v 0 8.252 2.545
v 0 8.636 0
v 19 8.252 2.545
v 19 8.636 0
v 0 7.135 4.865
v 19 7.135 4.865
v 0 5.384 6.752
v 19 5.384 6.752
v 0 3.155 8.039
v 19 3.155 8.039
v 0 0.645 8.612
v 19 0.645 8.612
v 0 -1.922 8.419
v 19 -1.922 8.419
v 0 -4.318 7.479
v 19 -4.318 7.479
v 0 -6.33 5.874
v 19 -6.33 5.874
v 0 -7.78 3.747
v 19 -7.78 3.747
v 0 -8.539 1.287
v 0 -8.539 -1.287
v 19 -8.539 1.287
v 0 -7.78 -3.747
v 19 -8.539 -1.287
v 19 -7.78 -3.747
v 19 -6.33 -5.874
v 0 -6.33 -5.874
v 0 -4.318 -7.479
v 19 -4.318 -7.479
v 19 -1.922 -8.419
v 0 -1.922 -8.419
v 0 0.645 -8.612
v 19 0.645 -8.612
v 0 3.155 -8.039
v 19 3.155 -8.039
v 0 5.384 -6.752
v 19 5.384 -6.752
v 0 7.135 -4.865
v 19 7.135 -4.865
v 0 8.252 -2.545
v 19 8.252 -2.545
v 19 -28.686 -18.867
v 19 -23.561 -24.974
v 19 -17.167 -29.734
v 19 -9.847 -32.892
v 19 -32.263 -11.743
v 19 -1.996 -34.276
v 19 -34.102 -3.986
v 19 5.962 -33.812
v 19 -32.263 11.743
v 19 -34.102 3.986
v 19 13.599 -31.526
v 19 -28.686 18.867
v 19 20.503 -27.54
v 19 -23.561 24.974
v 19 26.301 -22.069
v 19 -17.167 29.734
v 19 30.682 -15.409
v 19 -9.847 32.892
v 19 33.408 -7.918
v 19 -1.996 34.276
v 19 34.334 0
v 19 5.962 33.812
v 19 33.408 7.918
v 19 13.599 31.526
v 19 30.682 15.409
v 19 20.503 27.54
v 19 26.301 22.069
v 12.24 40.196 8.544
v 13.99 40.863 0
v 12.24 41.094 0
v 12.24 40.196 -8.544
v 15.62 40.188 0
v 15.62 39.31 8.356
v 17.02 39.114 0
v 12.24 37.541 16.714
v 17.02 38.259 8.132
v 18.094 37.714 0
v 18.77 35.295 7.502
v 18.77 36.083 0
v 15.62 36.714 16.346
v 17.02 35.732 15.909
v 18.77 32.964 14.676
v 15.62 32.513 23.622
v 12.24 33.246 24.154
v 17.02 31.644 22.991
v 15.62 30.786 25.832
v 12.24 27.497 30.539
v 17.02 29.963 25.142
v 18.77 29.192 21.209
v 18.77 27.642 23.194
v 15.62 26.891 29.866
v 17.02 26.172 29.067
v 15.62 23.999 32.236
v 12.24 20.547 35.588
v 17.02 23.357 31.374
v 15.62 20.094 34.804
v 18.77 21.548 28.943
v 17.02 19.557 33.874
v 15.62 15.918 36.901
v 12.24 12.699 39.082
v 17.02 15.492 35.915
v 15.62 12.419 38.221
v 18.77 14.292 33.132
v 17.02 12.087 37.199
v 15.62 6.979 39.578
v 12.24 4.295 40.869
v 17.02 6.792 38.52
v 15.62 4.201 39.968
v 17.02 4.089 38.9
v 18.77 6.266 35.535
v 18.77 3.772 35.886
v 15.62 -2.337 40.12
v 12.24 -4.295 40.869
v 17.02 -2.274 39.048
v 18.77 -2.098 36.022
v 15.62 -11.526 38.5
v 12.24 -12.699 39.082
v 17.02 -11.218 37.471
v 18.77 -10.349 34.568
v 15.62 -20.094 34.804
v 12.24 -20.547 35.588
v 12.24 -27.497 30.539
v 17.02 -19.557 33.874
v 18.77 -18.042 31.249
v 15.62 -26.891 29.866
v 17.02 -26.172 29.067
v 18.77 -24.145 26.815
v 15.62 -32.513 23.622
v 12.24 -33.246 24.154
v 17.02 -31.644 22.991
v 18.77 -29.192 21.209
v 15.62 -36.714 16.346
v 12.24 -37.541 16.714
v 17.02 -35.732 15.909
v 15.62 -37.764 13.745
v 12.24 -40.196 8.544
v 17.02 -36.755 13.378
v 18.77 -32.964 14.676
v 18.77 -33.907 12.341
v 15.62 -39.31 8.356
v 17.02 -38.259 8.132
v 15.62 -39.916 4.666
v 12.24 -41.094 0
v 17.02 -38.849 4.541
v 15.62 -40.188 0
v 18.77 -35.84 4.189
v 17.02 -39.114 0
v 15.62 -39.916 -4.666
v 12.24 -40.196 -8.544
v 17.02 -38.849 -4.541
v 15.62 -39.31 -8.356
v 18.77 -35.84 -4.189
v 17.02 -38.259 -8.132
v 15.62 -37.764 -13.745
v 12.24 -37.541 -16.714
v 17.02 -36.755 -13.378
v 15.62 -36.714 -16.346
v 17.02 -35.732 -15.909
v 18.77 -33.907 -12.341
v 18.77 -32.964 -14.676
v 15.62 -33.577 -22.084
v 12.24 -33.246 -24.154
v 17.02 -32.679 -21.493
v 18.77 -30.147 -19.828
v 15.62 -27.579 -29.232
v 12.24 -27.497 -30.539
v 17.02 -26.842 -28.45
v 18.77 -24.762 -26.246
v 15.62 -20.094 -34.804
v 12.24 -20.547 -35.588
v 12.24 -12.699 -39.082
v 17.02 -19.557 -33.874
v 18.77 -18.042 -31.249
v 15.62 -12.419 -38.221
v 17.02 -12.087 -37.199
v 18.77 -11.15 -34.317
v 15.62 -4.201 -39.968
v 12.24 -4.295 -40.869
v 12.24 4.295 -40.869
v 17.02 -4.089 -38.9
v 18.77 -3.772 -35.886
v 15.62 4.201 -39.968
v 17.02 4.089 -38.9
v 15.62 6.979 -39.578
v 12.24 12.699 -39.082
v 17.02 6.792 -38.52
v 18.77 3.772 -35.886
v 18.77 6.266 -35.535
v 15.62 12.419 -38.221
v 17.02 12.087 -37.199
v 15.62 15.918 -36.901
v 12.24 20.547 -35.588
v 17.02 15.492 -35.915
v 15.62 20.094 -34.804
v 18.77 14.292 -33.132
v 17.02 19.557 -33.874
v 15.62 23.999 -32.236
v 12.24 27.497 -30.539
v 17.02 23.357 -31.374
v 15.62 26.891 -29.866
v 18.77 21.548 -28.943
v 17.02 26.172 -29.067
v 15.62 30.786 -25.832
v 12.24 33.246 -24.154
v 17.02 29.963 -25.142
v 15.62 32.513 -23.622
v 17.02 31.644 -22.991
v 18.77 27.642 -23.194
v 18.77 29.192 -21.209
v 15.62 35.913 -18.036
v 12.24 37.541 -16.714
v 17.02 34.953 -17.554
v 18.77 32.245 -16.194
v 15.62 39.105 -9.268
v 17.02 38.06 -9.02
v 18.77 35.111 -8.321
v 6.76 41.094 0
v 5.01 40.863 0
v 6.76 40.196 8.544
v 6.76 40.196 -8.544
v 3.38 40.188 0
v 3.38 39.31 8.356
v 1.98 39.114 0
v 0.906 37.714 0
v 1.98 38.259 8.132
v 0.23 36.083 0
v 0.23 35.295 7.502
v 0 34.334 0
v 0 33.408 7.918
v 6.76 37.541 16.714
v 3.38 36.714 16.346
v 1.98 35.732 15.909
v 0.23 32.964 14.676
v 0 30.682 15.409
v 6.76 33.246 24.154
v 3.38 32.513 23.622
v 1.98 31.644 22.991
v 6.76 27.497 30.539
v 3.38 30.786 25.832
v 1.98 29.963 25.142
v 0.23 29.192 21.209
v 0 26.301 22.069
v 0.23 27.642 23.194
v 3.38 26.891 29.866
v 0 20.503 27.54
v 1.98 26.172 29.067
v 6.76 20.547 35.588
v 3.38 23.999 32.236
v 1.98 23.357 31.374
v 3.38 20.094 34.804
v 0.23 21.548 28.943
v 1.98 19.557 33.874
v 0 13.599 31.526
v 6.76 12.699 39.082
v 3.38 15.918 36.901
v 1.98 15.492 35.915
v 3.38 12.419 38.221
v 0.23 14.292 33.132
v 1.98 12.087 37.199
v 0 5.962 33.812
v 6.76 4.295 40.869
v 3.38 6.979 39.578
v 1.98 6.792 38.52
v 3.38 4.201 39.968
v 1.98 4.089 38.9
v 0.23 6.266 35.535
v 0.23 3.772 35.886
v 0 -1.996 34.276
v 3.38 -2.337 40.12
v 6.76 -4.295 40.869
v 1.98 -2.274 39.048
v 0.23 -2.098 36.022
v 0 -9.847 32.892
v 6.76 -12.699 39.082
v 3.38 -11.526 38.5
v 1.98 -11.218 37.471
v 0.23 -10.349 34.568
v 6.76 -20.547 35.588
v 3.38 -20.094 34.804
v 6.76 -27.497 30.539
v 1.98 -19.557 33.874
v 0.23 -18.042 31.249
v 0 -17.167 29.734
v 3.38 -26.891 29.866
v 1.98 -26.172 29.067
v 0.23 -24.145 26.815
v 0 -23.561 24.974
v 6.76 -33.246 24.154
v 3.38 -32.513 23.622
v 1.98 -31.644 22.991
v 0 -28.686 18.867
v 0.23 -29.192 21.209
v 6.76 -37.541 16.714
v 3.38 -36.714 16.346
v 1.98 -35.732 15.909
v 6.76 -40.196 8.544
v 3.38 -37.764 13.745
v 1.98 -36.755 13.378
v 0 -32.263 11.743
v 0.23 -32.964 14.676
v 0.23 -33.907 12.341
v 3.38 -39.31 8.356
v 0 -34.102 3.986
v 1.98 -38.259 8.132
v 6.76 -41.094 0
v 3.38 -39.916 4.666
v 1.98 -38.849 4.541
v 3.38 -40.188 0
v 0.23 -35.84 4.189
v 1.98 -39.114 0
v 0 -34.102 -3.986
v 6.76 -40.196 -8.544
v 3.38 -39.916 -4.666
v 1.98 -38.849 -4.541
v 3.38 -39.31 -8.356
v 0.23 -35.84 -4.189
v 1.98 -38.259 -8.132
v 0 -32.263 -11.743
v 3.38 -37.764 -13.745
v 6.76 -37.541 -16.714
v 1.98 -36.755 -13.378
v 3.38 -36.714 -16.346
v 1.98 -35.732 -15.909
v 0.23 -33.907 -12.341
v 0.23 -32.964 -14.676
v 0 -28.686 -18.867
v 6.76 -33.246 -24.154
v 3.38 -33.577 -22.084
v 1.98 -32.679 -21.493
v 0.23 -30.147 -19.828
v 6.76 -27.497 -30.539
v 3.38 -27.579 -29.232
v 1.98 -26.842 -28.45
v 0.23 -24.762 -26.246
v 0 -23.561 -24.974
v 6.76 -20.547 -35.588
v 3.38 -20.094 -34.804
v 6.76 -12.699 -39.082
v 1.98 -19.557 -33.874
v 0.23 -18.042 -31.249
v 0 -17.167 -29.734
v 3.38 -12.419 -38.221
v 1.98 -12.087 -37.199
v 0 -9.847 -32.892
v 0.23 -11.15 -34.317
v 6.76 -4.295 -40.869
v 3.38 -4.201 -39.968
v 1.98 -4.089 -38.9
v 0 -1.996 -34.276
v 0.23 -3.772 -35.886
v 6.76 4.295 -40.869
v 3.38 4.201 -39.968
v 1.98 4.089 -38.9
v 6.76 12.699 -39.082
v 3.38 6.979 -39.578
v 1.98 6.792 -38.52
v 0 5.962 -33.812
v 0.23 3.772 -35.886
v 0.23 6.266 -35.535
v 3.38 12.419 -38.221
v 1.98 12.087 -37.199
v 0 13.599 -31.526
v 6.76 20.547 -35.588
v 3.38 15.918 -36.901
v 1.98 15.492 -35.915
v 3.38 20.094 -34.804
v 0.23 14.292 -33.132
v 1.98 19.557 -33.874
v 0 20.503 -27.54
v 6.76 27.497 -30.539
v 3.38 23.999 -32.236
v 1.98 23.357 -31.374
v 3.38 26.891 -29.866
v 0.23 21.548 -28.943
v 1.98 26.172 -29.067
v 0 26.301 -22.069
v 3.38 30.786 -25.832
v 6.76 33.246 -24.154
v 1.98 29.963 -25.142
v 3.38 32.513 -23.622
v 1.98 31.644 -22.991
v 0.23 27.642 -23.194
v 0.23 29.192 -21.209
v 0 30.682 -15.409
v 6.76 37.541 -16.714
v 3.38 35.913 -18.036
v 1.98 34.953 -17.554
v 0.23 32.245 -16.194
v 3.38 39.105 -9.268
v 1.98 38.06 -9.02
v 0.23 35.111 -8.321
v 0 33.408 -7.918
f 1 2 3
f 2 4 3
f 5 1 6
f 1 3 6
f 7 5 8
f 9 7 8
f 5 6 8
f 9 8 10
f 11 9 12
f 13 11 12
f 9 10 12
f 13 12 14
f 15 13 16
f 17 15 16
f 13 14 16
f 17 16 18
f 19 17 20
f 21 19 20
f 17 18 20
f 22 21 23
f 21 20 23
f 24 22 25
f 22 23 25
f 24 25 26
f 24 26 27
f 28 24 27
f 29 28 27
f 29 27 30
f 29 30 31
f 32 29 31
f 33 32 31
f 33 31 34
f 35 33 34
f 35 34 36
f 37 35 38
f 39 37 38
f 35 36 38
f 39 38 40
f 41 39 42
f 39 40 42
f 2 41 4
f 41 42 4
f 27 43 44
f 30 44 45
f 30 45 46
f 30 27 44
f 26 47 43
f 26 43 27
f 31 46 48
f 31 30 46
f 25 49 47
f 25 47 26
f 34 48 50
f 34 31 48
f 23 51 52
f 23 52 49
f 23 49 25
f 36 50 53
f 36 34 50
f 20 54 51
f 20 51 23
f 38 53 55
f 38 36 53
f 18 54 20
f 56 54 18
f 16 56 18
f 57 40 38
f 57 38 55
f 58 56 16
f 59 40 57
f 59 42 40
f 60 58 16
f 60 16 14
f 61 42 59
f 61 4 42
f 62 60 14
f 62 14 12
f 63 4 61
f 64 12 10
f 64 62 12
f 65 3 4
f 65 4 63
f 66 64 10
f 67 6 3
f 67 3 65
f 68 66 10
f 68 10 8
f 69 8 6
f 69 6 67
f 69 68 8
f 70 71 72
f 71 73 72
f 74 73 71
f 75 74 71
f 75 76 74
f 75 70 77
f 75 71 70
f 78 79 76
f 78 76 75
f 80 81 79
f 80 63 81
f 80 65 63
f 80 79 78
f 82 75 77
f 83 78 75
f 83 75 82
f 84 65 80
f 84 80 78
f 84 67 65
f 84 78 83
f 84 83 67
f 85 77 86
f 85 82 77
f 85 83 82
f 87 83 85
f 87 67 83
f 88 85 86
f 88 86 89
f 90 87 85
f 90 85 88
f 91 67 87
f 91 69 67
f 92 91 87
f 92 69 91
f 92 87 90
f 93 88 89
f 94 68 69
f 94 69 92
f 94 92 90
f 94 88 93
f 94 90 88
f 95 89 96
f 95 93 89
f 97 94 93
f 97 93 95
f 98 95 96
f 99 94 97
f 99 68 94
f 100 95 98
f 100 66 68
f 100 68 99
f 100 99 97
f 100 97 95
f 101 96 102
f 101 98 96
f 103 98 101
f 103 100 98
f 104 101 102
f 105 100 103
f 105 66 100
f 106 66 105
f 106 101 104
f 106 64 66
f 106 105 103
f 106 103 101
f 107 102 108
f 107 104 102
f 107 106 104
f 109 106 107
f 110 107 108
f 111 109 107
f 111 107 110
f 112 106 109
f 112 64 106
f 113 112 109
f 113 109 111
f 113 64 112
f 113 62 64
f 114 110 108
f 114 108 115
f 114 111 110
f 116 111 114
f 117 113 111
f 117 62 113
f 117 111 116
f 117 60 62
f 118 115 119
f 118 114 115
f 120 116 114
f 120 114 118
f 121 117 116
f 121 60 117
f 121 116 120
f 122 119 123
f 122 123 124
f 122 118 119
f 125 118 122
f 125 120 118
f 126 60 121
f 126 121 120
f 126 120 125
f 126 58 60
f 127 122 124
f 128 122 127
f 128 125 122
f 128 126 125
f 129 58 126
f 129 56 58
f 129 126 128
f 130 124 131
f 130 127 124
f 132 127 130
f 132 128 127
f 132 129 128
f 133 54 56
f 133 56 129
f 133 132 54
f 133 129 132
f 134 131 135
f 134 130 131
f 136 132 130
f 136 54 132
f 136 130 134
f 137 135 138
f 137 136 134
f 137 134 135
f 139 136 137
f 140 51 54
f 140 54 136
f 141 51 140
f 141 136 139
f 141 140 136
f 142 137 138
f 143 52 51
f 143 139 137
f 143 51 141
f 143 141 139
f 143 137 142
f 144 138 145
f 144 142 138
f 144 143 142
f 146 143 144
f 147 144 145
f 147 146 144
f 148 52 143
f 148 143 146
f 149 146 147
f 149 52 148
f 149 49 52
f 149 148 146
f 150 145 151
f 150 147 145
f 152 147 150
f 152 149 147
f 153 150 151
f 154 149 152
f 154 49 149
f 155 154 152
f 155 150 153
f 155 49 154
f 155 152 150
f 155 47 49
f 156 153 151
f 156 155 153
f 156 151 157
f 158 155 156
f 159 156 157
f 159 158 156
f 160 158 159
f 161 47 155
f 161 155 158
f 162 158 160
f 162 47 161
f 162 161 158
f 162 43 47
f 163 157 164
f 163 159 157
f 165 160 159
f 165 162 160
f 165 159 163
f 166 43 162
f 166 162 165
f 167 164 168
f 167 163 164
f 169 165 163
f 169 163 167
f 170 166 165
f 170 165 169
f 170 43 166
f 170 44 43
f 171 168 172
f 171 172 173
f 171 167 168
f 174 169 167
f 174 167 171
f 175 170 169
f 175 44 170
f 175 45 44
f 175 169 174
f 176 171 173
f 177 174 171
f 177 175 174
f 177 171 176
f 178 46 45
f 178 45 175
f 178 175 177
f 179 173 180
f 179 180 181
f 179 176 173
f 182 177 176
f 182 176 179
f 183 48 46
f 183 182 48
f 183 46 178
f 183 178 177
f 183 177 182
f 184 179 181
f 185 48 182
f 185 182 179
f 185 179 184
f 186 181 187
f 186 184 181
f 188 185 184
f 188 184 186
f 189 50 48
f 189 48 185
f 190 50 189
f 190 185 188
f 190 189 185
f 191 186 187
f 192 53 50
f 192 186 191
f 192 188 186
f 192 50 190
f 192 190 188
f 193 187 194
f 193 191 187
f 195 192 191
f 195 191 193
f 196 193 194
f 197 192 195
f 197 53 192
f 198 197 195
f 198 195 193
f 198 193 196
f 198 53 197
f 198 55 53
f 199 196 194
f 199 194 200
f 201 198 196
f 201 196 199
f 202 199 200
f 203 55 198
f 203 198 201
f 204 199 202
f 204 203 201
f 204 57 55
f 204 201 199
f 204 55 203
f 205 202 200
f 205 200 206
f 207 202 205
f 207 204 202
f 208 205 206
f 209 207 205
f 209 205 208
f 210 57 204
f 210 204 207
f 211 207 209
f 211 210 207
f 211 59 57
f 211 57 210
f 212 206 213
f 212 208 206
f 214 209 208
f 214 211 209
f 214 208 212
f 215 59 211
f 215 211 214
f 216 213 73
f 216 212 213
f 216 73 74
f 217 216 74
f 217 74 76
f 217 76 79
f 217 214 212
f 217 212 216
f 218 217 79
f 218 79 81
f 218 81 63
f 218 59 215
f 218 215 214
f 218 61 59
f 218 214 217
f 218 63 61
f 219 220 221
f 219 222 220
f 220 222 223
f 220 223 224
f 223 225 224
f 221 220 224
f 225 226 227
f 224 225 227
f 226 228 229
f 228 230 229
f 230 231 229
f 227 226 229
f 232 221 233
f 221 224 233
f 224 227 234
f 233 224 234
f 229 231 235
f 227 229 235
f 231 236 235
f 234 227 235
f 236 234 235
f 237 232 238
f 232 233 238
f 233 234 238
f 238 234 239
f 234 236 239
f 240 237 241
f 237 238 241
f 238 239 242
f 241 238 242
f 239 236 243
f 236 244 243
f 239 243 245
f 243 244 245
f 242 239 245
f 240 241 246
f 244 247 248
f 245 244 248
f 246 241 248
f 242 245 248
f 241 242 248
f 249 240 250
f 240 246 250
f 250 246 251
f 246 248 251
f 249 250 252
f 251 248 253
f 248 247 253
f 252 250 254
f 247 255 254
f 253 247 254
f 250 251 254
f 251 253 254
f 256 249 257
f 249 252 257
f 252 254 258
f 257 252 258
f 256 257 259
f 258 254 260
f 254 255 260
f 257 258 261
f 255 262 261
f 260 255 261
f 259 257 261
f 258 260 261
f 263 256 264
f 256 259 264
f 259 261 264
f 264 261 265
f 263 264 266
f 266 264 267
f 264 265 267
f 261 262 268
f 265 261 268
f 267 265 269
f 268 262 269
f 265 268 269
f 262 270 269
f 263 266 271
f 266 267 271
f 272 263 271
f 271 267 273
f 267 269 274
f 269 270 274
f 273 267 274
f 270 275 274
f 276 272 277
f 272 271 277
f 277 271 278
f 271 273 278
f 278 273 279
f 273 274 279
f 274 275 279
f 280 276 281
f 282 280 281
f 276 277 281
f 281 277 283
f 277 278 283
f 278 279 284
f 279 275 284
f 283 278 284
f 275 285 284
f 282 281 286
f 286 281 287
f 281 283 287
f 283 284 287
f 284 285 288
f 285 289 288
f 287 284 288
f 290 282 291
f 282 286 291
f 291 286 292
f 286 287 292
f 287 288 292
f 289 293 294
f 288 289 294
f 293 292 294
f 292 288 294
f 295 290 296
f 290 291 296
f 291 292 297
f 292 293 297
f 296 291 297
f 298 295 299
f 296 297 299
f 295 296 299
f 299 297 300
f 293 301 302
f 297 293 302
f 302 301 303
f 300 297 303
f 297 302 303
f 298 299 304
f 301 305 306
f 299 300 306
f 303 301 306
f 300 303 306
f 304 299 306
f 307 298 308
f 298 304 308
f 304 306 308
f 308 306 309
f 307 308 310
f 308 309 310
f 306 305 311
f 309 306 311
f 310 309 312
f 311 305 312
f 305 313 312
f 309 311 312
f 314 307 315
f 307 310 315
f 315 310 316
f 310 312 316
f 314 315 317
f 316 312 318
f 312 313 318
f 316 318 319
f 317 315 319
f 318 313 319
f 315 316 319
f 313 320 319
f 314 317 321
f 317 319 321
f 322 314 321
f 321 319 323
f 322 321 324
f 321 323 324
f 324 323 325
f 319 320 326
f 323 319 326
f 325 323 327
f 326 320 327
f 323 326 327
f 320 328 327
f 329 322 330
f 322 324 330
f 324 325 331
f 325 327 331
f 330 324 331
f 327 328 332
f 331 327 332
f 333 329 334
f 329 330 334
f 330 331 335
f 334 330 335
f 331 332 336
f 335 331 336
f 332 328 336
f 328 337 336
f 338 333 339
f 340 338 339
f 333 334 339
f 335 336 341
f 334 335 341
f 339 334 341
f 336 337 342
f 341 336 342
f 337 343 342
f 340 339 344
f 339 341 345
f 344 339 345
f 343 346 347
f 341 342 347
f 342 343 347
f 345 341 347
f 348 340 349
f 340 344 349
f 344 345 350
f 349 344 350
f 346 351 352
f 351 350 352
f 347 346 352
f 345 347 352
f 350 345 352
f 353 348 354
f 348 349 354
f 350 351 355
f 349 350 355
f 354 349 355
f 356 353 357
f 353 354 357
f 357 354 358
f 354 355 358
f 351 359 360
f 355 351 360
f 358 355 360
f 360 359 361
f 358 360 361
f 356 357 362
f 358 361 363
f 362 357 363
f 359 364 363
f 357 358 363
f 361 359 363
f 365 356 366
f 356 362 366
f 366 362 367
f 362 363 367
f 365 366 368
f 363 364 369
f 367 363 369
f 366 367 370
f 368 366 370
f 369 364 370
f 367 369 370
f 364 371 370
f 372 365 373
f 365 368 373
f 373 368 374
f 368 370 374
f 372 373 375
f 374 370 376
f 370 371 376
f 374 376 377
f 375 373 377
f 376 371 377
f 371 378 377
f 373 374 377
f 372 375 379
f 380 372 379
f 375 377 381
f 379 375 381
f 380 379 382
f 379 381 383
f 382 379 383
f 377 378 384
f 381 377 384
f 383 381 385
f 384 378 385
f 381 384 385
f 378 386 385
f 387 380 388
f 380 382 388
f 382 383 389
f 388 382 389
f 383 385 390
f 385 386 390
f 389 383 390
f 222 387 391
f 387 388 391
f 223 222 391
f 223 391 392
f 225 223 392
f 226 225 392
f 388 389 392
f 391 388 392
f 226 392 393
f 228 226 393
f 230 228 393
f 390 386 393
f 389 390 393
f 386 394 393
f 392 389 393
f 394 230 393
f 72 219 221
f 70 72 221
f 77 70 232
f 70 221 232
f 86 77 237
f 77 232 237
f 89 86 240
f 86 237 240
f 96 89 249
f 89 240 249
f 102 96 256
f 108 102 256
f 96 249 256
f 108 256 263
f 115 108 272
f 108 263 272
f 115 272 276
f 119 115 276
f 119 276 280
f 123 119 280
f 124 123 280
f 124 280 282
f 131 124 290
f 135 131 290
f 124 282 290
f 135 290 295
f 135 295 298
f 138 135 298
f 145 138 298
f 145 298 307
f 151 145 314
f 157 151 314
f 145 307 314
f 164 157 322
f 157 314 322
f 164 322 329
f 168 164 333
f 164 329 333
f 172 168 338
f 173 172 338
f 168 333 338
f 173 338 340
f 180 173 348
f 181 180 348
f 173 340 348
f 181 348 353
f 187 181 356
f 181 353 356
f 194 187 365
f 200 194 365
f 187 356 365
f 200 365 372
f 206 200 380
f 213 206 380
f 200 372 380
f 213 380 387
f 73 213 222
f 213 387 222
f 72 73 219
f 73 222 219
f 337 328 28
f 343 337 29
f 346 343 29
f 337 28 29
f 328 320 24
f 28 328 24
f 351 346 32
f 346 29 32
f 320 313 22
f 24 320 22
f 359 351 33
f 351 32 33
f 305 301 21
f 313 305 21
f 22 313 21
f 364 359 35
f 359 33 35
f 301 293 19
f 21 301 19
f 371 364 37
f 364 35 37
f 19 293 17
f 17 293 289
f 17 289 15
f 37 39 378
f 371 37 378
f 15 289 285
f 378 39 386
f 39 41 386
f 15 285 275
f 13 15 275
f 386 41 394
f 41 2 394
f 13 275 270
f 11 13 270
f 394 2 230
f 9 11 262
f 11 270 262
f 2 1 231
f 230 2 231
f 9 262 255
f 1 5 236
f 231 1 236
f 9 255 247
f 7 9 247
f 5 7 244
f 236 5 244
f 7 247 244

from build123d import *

# Parameters (mm, degrees)
F0_R     = 41.093721
F1_DEPTH = 19
F2_R     = 6.759798
F3_R     = 8.635664
F4_DEPTH = 34.1


with BuildPart() as f1:
    # F0 (on Right) → F1 (new body)
    with BuildSketch(Plane.YZ):
        Circle(F0_R)
    extrude(amount=F1_DEPTH)

    # F2
    f2_edges = [f1.edges().sort_by_distance(p)[0] for p in [
        (19, -41.093721, 0),
        (0, -41.093721, 0),
    ]]
    fillet(f2_edges, radius=F2_R)

    # F3 (on Right) → F4 (cut, symmetric)
    with BuildSketch(Plane.YZ):
        Circle(F3_R)
    extrude(amount=F4_DEPTH, both=True, mode=Mode.SUBTRACT)


solid = f1.part
